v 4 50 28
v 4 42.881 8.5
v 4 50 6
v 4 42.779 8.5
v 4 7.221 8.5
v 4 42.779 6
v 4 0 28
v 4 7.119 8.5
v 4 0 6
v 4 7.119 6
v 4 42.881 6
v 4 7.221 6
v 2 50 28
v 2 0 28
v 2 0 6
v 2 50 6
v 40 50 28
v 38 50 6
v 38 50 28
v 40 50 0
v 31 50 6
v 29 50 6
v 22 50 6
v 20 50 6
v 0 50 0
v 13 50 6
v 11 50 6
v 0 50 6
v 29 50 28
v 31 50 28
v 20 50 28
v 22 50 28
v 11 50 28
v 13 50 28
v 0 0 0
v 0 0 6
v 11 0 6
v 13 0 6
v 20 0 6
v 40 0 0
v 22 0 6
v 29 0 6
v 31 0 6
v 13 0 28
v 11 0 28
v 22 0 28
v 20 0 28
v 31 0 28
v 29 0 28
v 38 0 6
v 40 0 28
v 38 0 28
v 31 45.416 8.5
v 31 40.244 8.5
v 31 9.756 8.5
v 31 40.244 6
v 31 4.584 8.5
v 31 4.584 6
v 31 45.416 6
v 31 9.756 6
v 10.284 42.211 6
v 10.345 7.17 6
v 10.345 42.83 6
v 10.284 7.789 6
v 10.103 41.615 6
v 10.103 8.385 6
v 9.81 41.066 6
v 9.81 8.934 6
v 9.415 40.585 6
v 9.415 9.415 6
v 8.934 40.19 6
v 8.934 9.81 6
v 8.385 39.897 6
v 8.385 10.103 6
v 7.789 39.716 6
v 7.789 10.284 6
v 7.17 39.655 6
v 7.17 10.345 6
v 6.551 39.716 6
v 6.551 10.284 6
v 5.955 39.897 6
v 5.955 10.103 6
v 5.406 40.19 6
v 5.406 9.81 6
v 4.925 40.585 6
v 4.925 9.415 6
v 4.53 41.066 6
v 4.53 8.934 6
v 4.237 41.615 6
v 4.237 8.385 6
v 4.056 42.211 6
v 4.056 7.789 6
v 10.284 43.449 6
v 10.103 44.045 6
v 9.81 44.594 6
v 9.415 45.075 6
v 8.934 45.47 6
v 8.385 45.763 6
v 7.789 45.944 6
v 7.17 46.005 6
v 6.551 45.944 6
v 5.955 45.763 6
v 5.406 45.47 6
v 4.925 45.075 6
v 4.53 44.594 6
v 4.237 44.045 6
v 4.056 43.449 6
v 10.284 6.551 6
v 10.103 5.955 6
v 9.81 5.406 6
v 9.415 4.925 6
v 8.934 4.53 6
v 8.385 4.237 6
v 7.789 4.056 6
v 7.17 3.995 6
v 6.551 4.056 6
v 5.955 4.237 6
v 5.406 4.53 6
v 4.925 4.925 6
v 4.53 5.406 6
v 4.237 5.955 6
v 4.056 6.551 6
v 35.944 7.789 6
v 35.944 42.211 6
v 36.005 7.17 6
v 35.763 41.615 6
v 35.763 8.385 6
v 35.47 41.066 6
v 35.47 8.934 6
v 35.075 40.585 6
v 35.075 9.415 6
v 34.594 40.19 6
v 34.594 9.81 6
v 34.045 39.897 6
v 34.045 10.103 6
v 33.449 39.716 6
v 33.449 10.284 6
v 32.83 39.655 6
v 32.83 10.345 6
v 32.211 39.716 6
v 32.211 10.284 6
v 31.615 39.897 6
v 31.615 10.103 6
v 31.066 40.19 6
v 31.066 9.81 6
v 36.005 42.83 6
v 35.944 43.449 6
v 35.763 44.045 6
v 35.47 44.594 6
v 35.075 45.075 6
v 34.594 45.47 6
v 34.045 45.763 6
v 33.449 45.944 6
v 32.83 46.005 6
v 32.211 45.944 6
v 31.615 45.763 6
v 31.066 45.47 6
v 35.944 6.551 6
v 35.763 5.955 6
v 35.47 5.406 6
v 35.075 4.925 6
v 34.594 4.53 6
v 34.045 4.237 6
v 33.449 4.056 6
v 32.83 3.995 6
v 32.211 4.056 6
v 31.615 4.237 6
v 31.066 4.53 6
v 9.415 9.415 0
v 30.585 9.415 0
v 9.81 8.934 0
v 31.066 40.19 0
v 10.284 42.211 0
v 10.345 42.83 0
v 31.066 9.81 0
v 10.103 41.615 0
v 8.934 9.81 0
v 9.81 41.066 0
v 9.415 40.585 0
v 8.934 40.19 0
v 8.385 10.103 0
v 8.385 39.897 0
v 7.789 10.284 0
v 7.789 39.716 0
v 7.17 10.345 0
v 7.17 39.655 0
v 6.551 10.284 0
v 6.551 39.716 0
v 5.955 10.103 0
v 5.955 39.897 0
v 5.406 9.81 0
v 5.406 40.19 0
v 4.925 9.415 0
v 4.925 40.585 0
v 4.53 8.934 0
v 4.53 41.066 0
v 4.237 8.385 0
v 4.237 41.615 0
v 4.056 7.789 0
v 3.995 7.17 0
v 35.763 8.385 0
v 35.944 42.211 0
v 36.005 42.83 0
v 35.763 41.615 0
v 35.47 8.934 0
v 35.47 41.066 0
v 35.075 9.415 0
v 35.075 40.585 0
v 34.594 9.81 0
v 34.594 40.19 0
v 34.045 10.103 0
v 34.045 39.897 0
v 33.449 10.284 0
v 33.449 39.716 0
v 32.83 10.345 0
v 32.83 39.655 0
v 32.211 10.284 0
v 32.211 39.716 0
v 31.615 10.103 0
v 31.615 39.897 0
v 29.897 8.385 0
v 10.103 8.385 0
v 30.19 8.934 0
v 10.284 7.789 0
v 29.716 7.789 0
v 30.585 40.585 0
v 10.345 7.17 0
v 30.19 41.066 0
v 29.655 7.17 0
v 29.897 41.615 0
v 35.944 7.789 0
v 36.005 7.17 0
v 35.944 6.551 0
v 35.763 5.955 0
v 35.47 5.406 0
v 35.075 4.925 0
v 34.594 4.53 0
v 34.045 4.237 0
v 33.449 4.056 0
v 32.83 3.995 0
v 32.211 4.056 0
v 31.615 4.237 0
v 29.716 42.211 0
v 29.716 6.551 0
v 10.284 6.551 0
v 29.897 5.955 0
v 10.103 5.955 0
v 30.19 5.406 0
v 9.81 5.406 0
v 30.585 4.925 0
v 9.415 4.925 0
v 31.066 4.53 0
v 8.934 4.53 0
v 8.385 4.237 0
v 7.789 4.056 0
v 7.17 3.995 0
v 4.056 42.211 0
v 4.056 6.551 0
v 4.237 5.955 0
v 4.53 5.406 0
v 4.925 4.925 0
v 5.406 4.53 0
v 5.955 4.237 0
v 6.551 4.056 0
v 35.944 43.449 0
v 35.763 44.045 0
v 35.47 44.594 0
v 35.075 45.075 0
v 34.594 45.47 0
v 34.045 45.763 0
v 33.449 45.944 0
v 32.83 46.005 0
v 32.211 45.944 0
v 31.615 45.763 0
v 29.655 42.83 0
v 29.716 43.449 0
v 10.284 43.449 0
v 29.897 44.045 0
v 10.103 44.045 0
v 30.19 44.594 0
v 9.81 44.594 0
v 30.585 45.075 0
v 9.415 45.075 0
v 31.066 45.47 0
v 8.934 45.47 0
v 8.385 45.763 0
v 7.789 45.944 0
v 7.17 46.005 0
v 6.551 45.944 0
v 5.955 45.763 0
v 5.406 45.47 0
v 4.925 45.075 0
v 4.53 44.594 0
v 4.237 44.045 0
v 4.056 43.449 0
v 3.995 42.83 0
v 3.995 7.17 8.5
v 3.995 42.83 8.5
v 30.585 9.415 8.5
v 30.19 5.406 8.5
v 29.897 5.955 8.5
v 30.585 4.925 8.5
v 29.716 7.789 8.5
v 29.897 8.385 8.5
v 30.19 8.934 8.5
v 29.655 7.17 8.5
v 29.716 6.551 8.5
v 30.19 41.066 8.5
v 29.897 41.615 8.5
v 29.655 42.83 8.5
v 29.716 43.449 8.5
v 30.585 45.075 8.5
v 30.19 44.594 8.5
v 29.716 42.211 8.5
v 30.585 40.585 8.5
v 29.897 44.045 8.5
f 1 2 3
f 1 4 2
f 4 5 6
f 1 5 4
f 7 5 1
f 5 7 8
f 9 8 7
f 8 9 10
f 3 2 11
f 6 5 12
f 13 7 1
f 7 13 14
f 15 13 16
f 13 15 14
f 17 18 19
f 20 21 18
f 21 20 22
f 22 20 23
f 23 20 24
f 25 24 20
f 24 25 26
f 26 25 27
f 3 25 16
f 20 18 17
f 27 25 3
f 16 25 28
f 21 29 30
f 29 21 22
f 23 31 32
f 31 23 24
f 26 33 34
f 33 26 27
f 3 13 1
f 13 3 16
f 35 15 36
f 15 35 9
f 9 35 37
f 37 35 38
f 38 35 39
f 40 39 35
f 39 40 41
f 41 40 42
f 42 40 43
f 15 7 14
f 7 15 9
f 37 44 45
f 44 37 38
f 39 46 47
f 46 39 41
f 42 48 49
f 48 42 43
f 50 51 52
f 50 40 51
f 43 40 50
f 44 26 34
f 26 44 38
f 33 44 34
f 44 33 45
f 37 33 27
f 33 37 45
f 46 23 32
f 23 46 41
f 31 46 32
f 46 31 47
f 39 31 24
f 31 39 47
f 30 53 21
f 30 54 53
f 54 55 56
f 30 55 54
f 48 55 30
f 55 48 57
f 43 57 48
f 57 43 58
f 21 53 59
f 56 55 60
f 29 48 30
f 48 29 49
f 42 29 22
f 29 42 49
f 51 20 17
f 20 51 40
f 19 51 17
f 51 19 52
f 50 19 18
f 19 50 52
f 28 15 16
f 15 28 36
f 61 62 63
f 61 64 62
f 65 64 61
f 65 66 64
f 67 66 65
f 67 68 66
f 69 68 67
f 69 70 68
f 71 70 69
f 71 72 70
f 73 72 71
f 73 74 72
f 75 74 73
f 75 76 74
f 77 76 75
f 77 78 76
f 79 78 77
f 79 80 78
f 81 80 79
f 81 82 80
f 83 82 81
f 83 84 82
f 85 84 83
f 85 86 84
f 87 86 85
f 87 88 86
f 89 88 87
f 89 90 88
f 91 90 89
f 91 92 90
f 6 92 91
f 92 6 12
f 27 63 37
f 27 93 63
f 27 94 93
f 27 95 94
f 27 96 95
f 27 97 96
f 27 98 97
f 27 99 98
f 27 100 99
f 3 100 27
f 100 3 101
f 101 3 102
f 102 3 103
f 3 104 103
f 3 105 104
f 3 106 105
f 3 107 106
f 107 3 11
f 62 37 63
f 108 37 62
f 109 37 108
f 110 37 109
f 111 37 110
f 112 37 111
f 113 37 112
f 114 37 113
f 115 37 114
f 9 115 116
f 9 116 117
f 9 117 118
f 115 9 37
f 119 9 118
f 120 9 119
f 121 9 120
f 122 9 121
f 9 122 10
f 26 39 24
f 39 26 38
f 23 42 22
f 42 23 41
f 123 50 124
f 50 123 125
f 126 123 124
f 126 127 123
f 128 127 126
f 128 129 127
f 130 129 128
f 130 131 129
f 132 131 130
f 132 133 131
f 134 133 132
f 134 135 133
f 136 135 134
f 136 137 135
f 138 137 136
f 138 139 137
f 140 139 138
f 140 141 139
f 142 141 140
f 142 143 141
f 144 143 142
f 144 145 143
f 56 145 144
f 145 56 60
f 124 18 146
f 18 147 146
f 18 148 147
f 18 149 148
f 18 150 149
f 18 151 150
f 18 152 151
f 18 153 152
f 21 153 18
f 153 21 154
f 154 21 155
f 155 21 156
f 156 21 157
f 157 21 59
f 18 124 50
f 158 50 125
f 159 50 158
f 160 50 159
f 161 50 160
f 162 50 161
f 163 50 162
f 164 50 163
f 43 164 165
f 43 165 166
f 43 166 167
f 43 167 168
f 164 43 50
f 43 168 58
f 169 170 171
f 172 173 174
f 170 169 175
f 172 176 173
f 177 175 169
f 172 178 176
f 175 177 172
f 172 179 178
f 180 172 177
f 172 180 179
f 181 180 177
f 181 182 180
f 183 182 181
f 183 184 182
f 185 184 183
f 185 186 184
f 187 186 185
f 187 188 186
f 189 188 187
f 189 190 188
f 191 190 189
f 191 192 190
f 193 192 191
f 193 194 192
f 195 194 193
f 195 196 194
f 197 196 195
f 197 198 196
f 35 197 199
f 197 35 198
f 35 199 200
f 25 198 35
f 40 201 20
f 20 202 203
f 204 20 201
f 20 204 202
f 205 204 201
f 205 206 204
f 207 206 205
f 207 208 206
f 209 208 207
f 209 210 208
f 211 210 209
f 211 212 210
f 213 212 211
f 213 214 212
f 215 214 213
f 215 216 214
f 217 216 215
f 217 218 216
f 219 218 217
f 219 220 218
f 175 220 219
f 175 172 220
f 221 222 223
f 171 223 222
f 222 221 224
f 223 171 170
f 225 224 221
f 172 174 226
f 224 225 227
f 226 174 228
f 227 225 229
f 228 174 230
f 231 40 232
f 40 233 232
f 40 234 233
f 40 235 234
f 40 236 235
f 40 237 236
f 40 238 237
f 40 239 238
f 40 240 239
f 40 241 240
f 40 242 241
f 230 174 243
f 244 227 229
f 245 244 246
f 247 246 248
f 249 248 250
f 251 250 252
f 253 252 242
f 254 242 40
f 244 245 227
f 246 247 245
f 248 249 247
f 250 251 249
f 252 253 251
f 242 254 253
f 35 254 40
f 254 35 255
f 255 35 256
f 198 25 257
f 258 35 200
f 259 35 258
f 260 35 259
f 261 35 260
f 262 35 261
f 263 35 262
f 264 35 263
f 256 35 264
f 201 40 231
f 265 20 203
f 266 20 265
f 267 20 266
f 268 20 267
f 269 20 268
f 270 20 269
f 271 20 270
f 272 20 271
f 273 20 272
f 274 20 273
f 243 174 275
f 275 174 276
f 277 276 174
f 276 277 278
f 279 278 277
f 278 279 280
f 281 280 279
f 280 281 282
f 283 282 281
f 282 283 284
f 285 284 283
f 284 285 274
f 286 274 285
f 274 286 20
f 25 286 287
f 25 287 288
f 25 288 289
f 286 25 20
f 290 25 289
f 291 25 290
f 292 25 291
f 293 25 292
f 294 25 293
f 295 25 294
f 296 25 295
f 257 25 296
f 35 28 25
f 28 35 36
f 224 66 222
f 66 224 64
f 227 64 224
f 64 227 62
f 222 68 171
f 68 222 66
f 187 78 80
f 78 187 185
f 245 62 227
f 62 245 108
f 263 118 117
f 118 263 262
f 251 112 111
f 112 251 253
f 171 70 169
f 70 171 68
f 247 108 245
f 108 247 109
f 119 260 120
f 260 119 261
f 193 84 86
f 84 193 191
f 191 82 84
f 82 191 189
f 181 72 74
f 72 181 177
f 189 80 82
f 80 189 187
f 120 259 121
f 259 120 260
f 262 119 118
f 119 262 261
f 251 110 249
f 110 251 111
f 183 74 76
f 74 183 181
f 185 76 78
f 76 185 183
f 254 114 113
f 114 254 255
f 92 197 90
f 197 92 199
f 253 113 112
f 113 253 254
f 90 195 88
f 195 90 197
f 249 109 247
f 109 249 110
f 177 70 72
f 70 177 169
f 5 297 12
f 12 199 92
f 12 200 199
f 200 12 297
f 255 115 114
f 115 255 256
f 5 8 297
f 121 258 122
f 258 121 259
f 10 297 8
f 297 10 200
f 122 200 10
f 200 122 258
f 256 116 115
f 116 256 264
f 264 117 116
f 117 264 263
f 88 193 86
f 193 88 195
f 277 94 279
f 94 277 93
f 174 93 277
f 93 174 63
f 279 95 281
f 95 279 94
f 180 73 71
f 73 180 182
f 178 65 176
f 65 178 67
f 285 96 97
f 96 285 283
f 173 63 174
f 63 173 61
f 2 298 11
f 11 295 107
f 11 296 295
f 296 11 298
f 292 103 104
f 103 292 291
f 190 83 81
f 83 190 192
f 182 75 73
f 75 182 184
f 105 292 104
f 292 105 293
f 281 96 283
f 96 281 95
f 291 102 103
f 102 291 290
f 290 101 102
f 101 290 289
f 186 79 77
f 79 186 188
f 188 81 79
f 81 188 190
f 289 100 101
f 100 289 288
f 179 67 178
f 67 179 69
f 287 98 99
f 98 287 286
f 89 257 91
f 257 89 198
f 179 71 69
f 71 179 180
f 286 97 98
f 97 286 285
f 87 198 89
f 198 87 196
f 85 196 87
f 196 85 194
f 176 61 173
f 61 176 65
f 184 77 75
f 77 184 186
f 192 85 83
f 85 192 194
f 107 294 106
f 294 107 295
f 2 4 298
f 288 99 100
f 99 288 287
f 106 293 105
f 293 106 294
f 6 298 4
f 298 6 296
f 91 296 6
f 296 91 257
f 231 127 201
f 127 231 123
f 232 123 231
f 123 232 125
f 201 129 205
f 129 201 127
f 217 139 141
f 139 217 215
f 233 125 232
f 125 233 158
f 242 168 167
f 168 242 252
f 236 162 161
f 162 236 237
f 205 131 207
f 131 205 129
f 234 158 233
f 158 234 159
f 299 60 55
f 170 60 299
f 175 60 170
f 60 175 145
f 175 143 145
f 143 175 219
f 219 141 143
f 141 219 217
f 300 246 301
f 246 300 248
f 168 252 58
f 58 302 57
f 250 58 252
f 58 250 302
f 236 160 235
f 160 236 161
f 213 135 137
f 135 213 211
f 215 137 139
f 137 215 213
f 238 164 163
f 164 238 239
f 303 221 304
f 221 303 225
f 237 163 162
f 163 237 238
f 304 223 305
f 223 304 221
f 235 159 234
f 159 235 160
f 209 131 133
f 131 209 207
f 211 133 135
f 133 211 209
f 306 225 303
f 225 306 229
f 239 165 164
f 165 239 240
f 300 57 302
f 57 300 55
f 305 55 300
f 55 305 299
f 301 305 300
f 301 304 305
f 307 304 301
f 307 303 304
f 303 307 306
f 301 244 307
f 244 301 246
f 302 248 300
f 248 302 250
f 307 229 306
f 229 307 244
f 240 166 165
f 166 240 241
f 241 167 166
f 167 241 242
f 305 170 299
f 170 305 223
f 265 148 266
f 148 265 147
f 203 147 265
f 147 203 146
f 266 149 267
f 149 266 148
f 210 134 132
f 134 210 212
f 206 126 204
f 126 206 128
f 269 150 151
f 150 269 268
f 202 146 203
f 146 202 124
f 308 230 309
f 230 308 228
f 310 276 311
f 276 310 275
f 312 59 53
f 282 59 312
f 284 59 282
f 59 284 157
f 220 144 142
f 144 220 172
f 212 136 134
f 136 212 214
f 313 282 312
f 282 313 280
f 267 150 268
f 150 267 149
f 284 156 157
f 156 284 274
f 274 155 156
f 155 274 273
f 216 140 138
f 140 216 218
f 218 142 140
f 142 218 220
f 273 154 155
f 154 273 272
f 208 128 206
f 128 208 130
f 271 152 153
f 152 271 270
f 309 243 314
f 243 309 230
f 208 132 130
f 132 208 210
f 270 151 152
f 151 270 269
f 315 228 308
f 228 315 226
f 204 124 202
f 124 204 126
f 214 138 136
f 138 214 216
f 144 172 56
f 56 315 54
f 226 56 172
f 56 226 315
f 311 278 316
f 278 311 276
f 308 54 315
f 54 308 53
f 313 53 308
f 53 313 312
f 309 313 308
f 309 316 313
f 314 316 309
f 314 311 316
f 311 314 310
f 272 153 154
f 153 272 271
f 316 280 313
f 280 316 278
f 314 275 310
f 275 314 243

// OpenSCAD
$fn = 32;

// ----------------------------------------------------------------------
// Finned heat sink: 40 x 50 mm base, 22 mm fins
// ----------------------------------------------------------------------

// --- parameters (mm) ---
base_w = 40;              // base width
base_d = 50;              // base depth
base_t = 6;               // base thickness
fin_h = 22;               // fin height above the base
holes_d = 6.35;           // fixing holes
hole_x = 12.83;           // hole offset in x
hole_y = 17.83;           // hole offset in y
fin_t = 2;                // fin thickness
fin_pitch = 9;            // fin pitch
fin_count = 5;            // number of fins
fin_x0 = 2;               // first fin offset

difference() {
  union() {
    cube([base_w, base_d, base_t]);
    for (i = [0 : fin_count - 1]) {
      translate([fin_x0 + i * fin_pitch, 0, base_t - 0.5]) cube([fin_t, base_d, fin_h + 0.5]);
    }
  }
  /* fixing holes through the base, 2.5 mm clear on both sides */
  for (hx = [-12.83, 12.83]) {
    for (hy = [-17.83, 17.83]) {
      translate([base_w / 2 + hx, base_d / 2 + hy, -2.5]) cylinder(h = base_t + 5, d = holes_d);
    }
  }
}
